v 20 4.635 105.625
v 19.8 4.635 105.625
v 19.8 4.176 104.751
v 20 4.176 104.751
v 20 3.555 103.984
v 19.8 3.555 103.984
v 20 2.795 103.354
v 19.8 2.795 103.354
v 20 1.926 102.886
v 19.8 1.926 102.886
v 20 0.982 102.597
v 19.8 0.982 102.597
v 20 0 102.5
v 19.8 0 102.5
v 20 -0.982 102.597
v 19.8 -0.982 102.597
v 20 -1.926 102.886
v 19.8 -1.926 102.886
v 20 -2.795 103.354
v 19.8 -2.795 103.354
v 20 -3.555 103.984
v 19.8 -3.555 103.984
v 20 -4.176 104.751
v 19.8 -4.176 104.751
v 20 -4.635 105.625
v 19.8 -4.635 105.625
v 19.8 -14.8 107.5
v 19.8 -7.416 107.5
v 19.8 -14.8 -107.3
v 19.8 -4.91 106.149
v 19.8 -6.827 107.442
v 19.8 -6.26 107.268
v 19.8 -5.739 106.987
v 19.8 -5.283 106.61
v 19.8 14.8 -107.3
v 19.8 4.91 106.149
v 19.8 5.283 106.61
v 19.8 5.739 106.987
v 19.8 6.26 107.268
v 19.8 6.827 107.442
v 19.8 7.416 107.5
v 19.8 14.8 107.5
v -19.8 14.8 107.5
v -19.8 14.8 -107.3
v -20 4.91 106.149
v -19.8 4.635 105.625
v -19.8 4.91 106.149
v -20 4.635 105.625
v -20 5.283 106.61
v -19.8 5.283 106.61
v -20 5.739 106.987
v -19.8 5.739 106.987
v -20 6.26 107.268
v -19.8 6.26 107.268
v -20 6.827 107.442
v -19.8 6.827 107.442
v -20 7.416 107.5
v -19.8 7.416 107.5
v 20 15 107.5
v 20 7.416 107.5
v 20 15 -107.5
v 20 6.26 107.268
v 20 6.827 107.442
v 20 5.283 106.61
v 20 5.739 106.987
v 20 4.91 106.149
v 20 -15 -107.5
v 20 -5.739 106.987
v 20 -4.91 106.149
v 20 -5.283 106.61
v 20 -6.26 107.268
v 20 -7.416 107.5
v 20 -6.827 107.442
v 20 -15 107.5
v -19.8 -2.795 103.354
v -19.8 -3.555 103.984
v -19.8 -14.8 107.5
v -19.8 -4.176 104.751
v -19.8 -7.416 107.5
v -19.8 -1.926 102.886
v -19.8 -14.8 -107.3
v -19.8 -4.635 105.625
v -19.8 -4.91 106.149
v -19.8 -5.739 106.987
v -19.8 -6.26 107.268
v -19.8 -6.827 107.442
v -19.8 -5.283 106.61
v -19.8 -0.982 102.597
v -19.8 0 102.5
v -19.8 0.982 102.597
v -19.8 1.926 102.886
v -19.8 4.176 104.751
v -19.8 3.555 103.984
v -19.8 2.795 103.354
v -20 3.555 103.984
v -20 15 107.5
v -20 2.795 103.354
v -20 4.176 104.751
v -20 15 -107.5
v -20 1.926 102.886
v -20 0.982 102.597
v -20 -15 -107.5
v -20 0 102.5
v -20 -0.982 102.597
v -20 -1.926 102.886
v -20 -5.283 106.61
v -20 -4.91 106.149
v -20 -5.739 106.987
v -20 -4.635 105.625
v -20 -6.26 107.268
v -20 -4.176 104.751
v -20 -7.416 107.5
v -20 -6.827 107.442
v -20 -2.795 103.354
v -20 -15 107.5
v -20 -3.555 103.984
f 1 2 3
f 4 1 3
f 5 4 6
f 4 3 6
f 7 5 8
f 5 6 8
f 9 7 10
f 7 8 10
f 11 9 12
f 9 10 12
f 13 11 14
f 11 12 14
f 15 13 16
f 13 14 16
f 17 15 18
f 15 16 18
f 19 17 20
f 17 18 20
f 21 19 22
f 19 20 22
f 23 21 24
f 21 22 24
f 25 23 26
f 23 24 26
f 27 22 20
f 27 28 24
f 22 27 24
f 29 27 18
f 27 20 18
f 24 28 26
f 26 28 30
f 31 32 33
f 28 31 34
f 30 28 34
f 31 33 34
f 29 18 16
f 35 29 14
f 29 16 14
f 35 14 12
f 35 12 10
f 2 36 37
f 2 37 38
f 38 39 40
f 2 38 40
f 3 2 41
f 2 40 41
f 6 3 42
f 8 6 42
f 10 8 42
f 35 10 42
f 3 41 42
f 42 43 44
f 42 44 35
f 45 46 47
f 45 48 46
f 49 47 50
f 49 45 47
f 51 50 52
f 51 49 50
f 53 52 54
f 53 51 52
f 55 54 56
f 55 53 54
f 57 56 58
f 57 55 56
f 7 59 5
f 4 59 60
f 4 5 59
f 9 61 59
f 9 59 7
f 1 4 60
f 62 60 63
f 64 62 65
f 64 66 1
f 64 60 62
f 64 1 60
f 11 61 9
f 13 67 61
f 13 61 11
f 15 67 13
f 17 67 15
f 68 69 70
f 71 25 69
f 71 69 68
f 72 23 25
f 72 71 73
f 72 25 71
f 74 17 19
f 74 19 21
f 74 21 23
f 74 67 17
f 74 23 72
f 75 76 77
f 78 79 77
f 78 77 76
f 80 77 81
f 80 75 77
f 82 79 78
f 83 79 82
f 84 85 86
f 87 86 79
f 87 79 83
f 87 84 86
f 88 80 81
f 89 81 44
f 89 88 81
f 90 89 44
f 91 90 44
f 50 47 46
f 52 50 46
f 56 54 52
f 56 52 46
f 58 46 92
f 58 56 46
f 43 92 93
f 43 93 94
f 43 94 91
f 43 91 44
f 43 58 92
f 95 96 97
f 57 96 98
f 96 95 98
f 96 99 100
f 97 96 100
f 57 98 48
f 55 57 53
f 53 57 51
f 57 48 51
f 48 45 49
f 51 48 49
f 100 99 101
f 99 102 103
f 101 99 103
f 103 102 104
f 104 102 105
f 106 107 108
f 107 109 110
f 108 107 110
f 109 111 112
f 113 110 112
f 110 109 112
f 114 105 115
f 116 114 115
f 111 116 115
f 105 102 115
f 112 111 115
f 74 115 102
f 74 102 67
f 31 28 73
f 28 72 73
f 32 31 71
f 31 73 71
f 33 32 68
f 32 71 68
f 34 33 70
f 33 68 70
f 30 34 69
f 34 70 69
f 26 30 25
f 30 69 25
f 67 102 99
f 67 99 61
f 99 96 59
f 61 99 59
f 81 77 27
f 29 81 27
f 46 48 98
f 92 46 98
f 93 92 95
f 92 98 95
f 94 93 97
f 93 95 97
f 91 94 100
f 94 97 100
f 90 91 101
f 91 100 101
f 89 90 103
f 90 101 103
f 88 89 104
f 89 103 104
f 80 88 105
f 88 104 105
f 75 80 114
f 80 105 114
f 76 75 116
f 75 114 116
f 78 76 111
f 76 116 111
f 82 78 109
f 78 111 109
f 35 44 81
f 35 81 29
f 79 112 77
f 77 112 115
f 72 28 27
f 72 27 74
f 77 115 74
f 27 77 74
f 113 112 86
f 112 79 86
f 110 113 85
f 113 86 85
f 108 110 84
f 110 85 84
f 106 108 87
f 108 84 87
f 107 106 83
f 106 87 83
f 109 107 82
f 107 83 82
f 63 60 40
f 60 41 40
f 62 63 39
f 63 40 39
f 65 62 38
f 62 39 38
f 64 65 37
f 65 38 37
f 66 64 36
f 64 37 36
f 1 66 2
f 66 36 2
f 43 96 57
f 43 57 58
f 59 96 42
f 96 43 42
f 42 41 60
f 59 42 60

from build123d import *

# Parameters (mm, degrees)
F0_W     = 40
F0_H     = 215
F1_DEPTH = 15
F2_W     = 39.6
F2_H     = 29.6
F3_DEPTH = 214.8
F5_DEPTH = 62.4
F6_R     = 3


with BuildPart() as f1:
    # F0 (on Front) → F1 (new body, symmetric)
    with BuildSketch(Plane.XZ):
        Rectangle(F0_W, F0_H)
    extrude(amount=F1_DEPTH, both=True)

    # F2 (on face) → F3 (cut)
    with BuildSketch(Plane.XY.offset(107.5)):
        Rectangle(F2_W, F2_H)
    extrude(amount=-F3_DEPTH, mode=Mode.SUBTRACT)

    # F4 (on face) → F5 (cut, symmetric)
    with BuildSketch(Plane(origin=(-20, 0, 0), x_dir=(0, -1, 0), z_dir=(-1, 0, 0))):
        with BuildLine():
            Line((5, 107.5), (-5, 107.5))
            ThreePointArc((-5, 107.5), (0, 102.5), (5, 107.5))
        make_face()
    extrude(amount=F5_DEPTH, both=True, mode=Mode.SUBTRACT)

    # F6
    f6_edges = [f1.edges().sort_by_distance(p)[0] for p in [
        (19.9, -5, 107.5),
        (-19.9, -5, 107.5),
        (19.9, 5, 107.5),
        (-19.9, 5, 107.5),
    ]]
    fillet(f6_edges, radius=F6_R)


solid = f1.part
